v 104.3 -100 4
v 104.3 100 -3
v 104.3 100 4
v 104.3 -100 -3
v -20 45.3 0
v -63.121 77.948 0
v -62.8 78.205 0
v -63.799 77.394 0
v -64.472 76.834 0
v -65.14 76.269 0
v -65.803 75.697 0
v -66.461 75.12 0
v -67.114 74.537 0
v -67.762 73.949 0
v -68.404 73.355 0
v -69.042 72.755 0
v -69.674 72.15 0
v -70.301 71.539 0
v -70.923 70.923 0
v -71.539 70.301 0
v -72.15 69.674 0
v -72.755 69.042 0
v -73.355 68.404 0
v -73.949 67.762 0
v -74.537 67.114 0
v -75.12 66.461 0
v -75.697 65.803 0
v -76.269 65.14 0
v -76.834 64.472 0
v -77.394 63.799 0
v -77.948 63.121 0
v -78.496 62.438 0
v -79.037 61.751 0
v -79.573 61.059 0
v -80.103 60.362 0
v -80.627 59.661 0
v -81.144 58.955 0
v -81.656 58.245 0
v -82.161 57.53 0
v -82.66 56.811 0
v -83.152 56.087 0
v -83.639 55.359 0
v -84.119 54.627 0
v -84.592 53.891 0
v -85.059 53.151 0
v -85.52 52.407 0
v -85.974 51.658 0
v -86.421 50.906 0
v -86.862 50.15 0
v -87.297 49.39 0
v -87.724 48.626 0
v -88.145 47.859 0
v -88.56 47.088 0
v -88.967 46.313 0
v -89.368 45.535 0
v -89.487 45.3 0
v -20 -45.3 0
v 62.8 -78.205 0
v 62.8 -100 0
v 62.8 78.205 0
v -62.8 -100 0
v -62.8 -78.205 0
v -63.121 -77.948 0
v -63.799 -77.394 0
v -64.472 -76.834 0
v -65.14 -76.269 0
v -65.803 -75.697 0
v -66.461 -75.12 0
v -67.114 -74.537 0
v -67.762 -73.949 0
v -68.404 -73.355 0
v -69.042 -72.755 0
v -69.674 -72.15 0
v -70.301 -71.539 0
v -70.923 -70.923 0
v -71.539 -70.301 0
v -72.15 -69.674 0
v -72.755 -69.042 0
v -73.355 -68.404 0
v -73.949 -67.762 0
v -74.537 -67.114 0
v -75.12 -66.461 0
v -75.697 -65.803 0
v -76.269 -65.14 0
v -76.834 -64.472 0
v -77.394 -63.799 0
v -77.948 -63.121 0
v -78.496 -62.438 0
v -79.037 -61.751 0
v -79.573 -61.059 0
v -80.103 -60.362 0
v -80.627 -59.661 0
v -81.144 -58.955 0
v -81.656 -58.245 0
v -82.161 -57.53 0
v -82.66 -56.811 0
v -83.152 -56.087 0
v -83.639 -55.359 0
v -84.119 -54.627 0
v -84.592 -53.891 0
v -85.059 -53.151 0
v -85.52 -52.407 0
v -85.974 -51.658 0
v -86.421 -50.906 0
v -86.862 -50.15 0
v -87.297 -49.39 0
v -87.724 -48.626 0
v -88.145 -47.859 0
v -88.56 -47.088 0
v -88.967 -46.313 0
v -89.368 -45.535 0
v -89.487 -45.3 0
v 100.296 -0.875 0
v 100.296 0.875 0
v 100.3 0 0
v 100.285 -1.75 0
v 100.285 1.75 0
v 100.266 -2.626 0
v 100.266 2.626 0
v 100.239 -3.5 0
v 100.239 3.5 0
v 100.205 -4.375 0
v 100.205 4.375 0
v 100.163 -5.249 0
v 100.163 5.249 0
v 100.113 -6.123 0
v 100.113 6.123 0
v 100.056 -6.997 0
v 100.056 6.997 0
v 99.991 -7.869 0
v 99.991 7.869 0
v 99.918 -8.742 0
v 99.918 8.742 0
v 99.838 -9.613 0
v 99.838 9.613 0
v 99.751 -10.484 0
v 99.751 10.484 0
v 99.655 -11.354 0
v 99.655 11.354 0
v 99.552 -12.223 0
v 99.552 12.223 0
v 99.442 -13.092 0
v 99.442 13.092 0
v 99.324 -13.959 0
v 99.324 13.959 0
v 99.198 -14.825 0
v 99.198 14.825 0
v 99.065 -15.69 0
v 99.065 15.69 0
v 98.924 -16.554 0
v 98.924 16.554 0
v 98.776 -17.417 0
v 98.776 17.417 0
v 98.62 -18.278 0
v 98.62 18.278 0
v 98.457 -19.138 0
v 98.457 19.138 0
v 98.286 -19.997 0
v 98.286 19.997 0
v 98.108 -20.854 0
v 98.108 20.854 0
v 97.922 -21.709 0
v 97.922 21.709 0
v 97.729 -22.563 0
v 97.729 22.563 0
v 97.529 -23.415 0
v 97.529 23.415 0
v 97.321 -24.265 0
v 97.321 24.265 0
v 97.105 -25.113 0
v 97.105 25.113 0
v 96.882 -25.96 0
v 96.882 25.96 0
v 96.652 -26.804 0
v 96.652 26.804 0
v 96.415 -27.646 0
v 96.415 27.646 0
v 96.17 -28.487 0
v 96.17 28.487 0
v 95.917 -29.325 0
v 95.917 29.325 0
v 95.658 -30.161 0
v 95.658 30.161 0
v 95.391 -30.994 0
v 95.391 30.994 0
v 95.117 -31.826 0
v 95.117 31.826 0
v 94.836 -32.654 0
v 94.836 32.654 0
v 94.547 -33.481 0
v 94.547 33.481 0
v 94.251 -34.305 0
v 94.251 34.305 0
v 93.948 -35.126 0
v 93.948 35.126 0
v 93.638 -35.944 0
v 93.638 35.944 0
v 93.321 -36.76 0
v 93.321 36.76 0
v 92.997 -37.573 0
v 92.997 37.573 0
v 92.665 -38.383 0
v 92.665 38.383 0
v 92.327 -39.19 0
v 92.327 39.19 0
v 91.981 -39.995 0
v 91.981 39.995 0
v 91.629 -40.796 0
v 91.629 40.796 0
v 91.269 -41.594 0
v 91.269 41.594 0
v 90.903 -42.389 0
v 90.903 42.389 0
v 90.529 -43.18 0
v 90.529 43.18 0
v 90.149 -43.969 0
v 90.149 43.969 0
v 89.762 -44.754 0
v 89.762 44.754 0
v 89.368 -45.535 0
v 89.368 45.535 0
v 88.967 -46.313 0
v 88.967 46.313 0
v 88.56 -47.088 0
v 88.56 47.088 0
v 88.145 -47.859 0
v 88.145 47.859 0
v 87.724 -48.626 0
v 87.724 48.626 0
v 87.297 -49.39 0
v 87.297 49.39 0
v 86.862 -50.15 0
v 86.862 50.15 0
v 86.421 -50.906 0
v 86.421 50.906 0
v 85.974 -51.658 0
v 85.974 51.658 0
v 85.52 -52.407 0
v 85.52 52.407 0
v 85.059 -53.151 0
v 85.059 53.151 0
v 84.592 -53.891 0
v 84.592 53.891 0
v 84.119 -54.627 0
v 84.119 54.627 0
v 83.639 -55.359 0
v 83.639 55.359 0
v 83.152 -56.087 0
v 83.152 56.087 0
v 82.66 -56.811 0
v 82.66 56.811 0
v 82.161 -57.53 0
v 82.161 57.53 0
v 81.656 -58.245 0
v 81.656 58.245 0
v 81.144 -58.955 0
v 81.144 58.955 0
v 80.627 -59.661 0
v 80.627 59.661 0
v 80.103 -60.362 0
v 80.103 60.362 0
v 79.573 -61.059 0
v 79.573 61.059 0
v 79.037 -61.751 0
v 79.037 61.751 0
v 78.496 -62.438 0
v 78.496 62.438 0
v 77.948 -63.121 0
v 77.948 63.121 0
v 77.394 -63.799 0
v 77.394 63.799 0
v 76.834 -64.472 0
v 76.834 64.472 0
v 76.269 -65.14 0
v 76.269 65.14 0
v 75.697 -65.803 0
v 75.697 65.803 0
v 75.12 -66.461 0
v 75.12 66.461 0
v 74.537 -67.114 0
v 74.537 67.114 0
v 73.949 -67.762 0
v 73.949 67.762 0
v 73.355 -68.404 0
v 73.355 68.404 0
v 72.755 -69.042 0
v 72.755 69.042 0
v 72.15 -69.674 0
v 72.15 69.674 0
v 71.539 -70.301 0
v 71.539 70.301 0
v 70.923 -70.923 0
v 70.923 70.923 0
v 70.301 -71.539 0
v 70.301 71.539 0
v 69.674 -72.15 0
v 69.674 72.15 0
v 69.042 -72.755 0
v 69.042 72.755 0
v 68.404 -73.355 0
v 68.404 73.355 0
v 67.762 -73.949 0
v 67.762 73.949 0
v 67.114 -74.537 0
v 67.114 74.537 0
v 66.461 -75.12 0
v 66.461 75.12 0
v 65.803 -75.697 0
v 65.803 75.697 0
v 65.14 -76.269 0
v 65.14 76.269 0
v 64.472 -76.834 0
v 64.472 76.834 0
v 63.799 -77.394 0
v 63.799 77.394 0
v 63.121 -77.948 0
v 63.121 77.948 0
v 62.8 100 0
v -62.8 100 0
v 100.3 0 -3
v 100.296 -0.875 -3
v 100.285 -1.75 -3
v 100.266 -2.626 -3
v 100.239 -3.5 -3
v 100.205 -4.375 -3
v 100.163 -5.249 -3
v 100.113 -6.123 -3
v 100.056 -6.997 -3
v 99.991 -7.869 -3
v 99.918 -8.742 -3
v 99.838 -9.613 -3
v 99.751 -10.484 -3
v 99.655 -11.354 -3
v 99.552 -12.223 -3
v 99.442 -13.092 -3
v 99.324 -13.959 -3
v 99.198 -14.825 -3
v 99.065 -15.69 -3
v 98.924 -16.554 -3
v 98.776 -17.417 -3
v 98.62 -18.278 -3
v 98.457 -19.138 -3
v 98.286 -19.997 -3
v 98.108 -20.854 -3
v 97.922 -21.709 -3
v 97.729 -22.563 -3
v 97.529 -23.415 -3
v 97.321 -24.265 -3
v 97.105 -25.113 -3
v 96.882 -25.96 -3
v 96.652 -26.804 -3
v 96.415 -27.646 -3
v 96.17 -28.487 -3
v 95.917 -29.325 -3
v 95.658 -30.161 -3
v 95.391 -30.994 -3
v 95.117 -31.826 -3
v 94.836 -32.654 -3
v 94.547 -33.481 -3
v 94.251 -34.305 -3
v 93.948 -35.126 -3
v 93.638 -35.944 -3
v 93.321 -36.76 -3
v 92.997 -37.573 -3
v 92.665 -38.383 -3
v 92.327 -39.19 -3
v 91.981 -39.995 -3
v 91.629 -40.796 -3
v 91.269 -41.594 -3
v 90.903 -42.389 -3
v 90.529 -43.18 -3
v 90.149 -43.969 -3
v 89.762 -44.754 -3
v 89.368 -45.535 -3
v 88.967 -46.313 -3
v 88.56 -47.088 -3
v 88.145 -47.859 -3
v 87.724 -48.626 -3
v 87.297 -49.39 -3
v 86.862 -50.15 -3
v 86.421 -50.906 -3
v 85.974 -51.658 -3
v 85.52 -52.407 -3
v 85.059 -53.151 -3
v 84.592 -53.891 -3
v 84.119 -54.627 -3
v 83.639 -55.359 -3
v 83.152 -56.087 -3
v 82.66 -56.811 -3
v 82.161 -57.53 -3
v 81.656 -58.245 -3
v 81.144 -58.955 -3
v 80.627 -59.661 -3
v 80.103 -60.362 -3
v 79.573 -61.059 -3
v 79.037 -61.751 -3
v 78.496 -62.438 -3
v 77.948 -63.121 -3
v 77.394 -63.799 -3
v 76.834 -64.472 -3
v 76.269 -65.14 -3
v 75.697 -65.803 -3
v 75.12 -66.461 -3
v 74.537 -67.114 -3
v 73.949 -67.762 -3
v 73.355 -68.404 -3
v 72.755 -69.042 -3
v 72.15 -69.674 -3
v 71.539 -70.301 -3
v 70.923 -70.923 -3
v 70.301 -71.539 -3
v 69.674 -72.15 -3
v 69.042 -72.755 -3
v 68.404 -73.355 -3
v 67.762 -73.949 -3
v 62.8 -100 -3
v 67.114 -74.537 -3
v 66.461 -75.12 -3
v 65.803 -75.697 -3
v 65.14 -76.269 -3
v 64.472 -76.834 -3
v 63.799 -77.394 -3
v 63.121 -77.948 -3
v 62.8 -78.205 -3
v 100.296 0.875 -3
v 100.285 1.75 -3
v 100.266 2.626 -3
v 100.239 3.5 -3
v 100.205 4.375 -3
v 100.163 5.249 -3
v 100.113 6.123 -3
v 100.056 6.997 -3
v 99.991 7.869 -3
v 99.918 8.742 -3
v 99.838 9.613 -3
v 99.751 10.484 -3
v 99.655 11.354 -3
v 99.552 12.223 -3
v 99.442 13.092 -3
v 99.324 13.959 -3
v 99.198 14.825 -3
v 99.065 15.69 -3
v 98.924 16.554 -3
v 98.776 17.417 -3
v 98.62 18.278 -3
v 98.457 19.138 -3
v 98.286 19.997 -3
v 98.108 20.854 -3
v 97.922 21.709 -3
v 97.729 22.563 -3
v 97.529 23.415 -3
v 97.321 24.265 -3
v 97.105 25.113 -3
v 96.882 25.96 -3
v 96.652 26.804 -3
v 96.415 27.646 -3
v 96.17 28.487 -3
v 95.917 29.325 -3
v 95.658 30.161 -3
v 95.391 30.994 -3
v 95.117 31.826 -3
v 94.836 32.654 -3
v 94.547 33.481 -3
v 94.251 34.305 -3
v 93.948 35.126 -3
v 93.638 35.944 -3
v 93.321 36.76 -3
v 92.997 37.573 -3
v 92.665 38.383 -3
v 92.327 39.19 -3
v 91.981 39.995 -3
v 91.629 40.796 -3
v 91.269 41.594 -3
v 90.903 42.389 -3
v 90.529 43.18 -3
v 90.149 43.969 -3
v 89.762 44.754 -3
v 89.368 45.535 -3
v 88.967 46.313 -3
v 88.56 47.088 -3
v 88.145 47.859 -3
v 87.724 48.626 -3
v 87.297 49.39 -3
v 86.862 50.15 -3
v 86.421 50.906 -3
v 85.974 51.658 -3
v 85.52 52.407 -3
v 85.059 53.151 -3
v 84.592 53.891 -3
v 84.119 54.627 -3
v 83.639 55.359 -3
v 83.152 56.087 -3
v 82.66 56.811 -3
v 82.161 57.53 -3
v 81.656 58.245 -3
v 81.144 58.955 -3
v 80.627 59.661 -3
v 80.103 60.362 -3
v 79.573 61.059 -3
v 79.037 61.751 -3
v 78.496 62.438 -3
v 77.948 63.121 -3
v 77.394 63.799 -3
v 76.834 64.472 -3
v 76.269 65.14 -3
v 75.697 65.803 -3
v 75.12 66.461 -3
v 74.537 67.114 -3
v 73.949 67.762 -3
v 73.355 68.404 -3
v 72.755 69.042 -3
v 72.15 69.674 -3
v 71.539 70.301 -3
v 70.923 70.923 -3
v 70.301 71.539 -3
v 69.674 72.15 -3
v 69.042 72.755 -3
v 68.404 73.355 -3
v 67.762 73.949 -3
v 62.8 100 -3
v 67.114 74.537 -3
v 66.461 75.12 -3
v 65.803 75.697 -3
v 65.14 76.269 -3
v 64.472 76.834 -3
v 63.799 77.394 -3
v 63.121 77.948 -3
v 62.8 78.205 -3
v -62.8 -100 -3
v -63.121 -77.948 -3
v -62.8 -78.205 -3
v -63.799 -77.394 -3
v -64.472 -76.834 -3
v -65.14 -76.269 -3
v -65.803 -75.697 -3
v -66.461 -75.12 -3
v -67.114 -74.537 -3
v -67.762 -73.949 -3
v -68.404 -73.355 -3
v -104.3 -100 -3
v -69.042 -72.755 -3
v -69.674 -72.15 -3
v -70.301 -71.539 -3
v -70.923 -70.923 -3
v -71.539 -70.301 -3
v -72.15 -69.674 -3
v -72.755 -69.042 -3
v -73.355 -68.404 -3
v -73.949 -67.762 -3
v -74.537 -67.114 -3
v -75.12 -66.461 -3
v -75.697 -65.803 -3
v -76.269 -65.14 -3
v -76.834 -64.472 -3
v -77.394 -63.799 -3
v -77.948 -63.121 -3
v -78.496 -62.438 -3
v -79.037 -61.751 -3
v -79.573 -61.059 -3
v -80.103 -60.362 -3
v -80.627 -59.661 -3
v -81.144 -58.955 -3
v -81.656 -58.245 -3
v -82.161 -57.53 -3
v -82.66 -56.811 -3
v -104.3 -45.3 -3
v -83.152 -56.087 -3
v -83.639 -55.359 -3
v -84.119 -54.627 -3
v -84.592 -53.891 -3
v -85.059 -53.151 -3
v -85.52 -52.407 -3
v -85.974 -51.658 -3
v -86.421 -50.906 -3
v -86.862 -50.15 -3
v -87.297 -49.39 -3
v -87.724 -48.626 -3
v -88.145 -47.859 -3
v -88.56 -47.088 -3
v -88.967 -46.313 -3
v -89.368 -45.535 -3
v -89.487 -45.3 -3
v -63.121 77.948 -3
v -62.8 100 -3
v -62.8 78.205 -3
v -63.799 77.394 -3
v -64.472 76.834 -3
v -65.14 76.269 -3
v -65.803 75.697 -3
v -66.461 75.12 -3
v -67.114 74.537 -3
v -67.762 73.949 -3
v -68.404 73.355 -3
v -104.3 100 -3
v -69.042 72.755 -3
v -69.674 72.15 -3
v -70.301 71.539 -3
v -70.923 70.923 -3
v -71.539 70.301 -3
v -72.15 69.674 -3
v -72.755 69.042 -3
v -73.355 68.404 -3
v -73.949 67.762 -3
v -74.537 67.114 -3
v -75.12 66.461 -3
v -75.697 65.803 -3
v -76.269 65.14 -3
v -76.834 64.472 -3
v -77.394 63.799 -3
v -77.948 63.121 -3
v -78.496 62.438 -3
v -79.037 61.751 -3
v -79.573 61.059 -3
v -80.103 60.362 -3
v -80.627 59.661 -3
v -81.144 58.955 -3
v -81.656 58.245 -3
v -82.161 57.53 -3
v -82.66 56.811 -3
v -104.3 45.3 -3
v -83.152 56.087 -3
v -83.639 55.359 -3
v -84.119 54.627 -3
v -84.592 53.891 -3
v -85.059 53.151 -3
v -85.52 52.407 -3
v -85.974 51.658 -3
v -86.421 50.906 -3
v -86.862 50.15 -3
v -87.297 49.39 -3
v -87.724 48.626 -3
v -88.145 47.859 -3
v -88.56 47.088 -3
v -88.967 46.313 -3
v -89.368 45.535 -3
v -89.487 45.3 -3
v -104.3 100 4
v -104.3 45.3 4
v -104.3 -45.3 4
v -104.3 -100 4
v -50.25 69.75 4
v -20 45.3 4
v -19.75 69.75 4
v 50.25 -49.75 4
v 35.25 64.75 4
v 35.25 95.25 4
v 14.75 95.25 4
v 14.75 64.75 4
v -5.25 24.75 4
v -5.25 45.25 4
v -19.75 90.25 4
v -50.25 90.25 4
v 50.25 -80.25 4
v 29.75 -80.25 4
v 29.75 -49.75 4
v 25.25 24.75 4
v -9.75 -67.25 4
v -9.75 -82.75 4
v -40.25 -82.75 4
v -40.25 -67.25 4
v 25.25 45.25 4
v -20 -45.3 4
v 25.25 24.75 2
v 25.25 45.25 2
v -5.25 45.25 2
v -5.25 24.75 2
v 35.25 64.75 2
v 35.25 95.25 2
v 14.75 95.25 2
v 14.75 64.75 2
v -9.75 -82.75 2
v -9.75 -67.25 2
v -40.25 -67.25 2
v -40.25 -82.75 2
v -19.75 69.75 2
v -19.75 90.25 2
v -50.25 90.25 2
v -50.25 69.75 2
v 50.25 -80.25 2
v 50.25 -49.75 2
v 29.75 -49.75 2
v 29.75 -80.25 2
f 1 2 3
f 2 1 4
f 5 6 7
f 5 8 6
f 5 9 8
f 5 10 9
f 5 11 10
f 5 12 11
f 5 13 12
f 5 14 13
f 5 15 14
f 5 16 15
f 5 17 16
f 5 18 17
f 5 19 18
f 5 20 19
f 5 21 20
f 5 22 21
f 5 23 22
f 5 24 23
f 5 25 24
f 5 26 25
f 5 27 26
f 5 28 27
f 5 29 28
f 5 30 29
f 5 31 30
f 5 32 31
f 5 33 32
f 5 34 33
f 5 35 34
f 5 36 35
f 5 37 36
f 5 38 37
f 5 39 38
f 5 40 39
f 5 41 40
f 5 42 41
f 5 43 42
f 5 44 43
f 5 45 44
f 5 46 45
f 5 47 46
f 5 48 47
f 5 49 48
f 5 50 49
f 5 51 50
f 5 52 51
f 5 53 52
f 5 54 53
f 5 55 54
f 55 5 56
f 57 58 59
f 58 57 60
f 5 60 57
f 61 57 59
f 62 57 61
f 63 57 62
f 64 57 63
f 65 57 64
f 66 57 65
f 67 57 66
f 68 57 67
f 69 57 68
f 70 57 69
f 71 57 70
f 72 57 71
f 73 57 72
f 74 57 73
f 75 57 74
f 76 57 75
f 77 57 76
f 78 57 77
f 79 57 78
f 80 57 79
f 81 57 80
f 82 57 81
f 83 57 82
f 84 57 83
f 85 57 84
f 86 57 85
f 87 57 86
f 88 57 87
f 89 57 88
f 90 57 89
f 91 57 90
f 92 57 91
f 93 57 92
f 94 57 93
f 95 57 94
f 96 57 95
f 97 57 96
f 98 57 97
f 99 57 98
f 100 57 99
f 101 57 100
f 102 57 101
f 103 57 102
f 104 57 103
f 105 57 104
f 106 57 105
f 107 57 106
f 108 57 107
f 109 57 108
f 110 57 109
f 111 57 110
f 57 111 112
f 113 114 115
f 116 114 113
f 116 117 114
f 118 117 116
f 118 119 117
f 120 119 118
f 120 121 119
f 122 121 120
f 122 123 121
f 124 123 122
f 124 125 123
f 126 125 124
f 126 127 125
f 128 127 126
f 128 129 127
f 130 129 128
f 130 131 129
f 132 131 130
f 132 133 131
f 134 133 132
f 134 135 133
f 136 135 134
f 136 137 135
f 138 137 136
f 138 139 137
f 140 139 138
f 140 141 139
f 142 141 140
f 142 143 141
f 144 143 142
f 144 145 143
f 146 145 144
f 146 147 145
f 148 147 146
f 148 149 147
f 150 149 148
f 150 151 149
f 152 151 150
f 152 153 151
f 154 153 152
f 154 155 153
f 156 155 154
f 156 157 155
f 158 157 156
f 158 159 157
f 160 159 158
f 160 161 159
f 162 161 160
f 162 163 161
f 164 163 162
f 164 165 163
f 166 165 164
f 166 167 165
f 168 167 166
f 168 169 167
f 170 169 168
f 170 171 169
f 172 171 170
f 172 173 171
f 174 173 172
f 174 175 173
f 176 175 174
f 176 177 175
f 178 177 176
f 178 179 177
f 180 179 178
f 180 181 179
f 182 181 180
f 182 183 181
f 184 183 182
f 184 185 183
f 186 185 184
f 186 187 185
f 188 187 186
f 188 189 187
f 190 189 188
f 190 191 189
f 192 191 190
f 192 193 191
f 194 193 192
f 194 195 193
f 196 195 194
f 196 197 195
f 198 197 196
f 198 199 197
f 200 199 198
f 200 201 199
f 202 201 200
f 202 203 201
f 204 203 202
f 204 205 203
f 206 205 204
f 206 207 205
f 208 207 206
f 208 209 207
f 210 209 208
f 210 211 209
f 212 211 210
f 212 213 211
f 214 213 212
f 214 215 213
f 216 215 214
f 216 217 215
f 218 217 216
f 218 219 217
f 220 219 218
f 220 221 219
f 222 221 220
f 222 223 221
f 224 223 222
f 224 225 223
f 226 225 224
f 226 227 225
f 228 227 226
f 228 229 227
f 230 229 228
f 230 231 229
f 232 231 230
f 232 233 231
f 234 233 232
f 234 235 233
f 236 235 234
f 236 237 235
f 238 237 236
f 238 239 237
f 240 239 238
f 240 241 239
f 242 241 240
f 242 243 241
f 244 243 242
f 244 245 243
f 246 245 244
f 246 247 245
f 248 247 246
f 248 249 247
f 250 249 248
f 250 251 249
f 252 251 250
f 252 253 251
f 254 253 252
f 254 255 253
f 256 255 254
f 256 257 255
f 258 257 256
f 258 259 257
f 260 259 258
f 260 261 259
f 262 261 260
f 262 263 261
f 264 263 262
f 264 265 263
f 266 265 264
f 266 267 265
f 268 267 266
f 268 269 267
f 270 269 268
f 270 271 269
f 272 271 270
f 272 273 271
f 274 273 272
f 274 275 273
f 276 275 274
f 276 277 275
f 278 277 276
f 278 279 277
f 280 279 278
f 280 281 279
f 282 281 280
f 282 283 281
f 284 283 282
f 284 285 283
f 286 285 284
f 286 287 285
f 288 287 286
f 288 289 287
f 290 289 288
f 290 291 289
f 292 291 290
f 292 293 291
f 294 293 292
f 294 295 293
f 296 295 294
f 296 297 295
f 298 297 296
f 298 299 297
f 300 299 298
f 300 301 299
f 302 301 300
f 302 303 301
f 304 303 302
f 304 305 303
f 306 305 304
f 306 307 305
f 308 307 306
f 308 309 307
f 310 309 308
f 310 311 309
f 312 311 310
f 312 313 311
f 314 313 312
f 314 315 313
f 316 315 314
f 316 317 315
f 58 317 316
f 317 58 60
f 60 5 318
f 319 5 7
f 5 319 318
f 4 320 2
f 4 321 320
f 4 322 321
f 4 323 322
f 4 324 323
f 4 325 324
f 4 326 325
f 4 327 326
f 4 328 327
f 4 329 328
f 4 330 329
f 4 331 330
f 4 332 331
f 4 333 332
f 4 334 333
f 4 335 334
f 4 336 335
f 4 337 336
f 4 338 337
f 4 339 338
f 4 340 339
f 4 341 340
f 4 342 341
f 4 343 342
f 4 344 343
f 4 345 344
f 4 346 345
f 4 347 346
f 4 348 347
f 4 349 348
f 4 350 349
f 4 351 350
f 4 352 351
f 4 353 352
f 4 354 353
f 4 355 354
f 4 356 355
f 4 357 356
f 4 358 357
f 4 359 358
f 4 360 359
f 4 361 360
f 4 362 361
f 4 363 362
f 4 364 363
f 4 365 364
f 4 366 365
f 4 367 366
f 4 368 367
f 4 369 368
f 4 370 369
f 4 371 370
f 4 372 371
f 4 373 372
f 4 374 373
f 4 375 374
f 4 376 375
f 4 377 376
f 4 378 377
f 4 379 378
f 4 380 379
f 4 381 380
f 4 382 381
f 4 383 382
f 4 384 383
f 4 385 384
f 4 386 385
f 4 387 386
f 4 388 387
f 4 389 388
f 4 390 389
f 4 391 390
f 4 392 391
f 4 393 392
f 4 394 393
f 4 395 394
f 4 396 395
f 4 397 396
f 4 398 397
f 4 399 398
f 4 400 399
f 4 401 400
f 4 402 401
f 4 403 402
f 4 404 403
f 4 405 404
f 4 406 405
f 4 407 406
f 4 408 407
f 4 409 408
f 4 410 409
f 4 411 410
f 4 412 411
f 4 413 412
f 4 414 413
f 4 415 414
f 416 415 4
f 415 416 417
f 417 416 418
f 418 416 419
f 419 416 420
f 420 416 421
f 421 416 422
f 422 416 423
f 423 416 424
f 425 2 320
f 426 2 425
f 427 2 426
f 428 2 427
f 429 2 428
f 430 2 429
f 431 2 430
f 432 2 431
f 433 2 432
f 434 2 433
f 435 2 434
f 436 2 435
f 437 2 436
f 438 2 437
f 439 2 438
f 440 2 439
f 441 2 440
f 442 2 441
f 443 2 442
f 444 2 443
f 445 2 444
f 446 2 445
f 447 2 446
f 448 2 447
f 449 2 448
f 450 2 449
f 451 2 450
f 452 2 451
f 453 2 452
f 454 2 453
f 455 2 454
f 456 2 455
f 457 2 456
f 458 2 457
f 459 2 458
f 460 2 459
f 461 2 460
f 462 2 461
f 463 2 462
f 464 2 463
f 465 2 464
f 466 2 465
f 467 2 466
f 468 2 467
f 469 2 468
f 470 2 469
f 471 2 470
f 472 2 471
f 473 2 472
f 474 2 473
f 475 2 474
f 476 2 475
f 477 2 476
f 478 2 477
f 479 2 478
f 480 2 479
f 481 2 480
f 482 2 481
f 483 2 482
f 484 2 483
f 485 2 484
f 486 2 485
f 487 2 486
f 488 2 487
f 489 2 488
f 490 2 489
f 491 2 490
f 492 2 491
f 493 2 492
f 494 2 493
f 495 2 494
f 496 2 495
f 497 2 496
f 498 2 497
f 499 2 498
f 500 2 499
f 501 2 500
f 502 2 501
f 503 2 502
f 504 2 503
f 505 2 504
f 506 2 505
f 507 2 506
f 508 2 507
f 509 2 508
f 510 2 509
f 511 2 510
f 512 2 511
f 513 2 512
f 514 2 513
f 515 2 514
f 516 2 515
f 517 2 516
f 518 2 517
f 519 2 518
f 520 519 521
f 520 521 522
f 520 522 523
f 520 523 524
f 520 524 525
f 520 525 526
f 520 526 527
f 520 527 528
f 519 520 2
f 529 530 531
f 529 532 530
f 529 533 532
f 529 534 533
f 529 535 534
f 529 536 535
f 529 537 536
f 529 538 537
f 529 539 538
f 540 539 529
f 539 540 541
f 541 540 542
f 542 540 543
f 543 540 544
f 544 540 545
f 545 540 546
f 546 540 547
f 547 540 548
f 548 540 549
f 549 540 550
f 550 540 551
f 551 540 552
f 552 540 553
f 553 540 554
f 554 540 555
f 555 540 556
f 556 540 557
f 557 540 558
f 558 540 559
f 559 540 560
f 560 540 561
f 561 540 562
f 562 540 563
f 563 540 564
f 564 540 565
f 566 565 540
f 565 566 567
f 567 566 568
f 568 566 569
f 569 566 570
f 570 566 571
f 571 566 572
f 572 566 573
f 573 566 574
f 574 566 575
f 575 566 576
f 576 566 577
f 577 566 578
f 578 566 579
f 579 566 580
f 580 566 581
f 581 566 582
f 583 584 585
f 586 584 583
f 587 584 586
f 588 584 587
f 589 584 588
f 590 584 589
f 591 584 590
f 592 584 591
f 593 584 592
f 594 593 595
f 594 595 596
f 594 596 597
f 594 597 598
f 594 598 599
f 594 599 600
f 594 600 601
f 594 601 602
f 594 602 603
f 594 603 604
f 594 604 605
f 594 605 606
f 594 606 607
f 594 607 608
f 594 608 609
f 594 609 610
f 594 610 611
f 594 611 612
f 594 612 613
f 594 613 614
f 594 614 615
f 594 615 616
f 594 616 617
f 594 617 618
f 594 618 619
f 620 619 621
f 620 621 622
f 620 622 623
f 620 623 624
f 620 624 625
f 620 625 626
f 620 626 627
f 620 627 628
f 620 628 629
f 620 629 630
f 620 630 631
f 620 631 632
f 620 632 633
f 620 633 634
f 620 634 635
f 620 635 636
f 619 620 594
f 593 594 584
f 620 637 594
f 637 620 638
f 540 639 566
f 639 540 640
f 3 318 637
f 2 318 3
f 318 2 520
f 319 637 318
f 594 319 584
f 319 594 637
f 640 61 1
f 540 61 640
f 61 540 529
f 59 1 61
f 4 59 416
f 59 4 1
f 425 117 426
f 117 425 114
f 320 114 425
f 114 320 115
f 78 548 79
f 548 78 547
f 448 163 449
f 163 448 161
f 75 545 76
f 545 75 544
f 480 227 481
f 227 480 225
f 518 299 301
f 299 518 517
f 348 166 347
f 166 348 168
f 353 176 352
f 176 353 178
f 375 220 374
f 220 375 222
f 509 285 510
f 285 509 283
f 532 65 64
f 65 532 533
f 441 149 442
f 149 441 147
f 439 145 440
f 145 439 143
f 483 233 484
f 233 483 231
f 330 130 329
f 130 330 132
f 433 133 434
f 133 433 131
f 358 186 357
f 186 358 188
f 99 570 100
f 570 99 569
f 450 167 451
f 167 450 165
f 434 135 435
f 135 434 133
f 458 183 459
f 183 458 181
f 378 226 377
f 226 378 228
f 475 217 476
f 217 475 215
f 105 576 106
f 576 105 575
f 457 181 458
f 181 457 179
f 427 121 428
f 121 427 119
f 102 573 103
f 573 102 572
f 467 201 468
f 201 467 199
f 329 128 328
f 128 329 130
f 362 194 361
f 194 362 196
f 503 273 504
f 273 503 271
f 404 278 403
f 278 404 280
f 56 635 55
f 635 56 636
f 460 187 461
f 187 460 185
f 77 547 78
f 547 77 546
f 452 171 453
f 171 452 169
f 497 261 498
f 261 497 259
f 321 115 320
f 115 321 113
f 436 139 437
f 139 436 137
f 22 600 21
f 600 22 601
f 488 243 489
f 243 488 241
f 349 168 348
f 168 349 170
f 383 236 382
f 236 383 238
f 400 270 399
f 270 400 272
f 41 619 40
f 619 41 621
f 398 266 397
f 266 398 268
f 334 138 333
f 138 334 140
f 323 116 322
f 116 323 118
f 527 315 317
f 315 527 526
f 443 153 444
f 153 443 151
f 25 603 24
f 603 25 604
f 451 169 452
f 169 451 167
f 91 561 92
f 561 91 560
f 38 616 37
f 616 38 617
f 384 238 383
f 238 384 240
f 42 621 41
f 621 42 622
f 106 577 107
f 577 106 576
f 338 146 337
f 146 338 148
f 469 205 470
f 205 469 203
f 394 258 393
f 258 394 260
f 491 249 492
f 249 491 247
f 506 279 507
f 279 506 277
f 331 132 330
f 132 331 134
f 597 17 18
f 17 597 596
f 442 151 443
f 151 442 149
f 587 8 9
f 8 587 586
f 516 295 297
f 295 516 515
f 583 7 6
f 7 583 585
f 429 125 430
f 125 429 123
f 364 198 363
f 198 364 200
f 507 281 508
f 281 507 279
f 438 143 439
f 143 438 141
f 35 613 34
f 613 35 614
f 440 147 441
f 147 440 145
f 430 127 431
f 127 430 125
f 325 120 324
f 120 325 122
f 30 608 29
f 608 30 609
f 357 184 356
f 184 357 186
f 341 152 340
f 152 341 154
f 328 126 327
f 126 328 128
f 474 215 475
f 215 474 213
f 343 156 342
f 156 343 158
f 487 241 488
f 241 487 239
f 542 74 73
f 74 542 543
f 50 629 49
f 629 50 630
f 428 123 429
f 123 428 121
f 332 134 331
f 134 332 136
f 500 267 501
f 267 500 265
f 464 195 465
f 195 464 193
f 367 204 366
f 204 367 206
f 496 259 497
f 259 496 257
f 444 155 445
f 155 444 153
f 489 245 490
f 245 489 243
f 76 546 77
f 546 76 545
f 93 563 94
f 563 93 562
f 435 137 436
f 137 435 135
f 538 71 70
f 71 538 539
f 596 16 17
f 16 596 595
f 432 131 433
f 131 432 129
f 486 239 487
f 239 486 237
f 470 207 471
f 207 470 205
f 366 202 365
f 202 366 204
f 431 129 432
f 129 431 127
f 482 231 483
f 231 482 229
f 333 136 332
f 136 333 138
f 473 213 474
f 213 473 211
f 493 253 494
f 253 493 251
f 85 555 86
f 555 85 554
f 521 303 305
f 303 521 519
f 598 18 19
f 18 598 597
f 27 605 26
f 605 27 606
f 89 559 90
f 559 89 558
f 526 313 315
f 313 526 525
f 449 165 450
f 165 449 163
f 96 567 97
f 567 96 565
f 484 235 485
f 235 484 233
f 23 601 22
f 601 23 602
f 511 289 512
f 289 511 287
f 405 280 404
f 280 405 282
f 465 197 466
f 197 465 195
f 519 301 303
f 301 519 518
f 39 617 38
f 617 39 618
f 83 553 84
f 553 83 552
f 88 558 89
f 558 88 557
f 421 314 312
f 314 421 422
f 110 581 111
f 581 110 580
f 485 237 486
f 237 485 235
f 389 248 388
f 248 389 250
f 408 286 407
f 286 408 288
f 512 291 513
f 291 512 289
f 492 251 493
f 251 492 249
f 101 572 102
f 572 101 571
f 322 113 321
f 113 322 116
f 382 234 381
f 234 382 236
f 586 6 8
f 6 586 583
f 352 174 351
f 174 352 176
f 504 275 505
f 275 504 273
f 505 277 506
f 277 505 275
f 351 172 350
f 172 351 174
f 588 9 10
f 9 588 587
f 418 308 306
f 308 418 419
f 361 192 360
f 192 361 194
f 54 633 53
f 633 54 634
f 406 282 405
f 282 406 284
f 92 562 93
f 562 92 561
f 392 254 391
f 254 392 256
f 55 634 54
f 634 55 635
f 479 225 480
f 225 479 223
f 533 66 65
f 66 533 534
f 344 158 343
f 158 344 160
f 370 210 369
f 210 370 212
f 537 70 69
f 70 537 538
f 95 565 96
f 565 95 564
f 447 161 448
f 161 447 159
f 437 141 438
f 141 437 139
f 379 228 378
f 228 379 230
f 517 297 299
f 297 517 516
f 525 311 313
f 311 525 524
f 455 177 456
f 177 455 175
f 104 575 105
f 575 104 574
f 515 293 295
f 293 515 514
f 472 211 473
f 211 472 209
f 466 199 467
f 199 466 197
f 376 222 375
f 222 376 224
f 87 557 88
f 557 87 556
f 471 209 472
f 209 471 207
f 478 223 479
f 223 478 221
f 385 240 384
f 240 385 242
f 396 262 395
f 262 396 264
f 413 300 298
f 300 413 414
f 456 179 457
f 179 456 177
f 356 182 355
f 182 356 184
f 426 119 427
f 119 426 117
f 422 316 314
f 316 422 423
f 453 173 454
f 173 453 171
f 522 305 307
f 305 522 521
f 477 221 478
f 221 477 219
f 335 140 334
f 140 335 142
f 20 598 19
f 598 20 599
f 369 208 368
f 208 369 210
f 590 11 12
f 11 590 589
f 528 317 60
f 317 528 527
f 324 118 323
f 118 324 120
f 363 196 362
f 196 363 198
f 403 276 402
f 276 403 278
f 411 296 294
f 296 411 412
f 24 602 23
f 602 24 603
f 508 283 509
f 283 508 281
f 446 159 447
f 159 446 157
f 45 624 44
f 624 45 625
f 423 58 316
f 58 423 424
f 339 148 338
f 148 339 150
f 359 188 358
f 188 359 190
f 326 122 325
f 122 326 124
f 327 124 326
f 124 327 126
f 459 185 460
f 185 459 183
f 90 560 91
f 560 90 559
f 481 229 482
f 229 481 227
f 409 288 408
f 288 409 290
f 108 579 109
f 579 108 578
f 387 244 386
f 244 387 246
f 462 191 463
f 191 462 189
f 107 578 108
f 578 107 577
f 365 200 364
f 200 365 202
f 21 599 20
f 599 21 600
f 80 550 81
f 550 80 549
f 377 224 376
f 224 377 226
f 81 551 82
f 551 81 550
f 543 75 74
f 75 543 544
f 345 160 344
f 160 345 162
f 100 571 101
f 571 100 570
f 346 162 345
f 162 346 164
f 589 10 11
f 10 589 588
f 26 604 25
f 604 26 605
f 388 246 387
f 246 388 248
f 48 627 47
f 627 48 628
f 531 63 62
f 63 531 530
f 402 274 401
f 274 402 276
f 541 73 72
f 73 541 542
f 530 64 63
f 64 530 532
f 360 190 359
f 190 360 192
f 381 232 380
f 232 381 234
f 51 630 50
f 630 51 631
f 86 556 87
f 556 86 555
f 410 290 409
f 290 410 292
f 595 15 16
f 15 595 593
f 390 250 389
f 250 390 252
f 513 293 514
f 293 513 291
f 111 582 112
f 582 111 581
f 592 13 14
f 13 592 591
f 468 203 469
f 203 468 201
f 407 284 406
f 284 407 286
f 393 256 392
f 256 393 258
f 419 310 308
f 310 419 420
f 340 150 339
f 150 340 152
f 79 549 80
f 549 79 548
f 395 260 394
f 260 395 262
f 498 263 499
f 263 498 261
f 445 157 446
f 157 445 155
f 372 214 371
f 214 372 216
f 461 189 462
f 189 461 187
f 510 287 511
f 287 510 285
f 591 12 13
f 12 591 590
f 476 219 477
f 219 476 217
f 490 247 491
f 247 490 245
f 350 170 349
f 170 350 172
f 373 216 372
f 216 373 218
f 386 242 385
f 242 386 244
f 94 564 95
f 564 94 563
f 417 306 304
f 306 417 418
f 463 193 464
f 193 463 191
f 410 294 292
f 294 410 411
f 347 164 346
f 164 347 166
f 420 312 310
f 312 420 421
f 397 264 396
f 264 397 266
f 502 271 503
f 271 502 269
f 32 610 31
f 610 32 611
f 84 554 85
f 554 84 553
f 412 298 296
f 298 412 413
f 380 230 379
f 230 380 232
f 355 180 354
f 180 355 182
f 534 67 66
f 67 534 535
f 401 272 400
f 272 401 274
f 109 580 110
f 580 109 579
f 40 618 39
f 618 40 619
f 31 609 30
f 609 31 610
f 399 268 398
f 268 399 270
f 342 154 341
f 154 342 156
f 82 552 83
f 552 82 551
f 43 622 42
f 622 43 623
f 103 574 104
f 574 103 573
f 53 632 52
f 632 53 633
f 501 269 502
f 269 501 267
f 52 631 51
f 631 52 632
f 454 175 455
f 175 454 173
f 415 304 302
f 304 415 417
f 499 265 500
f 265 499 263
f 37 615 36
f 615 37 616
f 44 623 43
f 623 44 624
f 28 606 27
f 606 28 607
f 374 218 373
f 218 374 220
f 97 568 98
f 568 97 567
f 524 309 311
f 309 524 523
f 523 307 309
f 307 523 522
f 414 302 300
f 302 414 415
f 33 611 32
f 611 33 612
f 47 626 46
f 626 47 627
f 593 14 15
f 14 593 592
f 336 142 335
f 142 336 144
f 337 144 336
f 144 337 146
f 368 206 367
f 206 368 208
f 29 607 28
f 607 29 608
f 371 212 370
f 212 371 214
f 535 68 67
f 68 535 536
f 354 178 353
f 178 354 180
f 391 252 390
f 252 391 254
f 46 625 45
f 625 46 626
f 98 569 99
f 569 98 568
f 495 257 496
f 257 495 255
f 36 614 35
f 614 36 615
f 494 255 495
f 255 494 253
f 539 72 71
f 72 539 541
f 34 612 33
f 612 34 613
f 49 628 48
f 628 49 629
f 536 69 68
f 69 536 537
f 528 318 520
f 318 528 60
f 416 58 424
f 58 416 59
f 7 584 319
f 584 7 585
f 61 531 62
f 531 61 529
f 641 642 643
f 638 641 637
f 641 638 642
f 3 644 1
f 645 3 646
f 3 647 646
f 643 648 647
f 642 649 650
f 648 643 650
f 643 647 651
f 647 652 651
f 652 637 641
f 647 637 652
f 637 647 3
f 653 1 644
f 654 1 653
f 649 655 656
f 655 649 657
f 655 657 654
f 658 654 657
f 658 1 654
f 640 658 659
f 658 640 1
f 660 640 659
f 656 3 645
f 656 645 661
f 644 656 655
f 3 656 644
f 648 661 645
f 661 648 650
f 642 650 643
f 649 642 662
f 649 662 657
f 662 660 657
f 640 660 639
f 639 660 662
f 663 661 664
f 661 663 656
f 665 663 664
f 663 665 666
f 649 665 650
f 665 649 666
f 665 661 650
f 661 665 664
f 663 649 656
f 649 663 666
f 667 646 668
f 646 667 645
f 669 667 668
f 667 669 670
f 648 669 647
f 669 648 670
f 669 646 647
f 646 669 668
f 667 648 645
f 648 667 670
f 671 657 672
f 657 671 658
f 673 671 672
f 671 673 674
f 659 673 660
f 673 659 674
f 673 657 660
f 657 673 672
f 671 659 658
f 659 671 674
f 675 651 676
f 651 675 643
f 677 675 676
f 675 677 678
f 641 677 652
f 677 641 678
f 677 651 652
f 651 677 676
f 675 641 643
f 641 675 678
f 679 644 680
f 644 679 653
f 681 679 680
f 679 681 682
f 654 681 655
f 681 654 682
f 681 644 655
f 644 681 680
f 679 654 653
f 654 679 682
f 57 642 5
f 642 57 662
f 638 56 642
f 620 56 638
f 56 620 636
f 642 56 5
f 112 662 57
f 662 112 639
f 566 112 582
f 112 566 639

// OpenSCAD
// Mail-delivery localization frame, rev B (2026-10-29), units mm. Generated
// by make_localization_frame.py; the same dimensions as localization_frame.stl.
// Origin O = centre of the UNDERSIDE (the face it rests on); +x = the drone's
// travel at that step; +y left; z up. The five marker holders (holders/*.stl)
// glue into the pockets; obj_0 = their markers, Motive's default pivot.
HAT_R = 100.0; BOX_D = 125.0; CLR = 0.3;           // what it fits
ENV_L = 150.0; ENV_W = 90.0; OVERHANG = 70.0;      // the envelope it places
R_IN = HAT_R + CLR;          // skirt arc (drops over the hat's rim)
XF = BOX_D / 2 + CLR;        // skirt flats (close on the mailbox's front and back faces)
XO = R_IN + 4.0; HY = 100.0;
PLATE_T = 4.0; SKIRT_D = 3.0;
SLOT_HY = ENV_W / 2 + CLR;                 // U-slot, open to the -x edge
SLOT_STOP = -(HAT_R + OVERHANG) + ENV_L;   // the envelope's far end stop
POCKET_D = 2.0;
POCKETS = [[10.0, 35.0, 30.5, 20.5] /* A */, [25.0, 80.0, 20.5, 30.5] /* B */, [-25.0, -75.0, 30.5, 15.5] /* C */, [-35.0, 80.0, 30.5, 20.5] /* D */, [40.0, -65.0, 20.5, 30.5] /* D */];   // centre x, y, size x, size y (holder design in the comment)

difference() {
    union() {
        translate([-XO, -HY, 0]) cube([2 * XO, 2 * HY, PLATE_T]);              // plate
        difference() {                                                        // the two skirts
            translate([-XO, -HY, -SKIRT_D]) cube([2 * XO, 2 * HY, SKIRT_D]);
            translate([0, 0, -SKIRT_D - 1]) cylinder(r = R_IN, h = SKIRT_D + 2, $fn = 720);
            translate([-XF, -HY - 1, -SKIRT_D - 1]) cube([2 * XF, 2 * HY + 2, SKIRT_D + 2]);
        }
    }
    translate([-XO - 1, -SLOT_HY, -SKIRT_D - 1]) cube([SLOT_STOP + XO + 1, 2 * SLOT_HY, PLATE_T + SKIRT_D + 2]);
    for (p = POCKETS) translate([p[0] - p[2] / 2, p[1] - p[3] / 2, PLATE_T - POCKET_D])
        cube([p[2], p[3], POCKET_D + 1]);
}
